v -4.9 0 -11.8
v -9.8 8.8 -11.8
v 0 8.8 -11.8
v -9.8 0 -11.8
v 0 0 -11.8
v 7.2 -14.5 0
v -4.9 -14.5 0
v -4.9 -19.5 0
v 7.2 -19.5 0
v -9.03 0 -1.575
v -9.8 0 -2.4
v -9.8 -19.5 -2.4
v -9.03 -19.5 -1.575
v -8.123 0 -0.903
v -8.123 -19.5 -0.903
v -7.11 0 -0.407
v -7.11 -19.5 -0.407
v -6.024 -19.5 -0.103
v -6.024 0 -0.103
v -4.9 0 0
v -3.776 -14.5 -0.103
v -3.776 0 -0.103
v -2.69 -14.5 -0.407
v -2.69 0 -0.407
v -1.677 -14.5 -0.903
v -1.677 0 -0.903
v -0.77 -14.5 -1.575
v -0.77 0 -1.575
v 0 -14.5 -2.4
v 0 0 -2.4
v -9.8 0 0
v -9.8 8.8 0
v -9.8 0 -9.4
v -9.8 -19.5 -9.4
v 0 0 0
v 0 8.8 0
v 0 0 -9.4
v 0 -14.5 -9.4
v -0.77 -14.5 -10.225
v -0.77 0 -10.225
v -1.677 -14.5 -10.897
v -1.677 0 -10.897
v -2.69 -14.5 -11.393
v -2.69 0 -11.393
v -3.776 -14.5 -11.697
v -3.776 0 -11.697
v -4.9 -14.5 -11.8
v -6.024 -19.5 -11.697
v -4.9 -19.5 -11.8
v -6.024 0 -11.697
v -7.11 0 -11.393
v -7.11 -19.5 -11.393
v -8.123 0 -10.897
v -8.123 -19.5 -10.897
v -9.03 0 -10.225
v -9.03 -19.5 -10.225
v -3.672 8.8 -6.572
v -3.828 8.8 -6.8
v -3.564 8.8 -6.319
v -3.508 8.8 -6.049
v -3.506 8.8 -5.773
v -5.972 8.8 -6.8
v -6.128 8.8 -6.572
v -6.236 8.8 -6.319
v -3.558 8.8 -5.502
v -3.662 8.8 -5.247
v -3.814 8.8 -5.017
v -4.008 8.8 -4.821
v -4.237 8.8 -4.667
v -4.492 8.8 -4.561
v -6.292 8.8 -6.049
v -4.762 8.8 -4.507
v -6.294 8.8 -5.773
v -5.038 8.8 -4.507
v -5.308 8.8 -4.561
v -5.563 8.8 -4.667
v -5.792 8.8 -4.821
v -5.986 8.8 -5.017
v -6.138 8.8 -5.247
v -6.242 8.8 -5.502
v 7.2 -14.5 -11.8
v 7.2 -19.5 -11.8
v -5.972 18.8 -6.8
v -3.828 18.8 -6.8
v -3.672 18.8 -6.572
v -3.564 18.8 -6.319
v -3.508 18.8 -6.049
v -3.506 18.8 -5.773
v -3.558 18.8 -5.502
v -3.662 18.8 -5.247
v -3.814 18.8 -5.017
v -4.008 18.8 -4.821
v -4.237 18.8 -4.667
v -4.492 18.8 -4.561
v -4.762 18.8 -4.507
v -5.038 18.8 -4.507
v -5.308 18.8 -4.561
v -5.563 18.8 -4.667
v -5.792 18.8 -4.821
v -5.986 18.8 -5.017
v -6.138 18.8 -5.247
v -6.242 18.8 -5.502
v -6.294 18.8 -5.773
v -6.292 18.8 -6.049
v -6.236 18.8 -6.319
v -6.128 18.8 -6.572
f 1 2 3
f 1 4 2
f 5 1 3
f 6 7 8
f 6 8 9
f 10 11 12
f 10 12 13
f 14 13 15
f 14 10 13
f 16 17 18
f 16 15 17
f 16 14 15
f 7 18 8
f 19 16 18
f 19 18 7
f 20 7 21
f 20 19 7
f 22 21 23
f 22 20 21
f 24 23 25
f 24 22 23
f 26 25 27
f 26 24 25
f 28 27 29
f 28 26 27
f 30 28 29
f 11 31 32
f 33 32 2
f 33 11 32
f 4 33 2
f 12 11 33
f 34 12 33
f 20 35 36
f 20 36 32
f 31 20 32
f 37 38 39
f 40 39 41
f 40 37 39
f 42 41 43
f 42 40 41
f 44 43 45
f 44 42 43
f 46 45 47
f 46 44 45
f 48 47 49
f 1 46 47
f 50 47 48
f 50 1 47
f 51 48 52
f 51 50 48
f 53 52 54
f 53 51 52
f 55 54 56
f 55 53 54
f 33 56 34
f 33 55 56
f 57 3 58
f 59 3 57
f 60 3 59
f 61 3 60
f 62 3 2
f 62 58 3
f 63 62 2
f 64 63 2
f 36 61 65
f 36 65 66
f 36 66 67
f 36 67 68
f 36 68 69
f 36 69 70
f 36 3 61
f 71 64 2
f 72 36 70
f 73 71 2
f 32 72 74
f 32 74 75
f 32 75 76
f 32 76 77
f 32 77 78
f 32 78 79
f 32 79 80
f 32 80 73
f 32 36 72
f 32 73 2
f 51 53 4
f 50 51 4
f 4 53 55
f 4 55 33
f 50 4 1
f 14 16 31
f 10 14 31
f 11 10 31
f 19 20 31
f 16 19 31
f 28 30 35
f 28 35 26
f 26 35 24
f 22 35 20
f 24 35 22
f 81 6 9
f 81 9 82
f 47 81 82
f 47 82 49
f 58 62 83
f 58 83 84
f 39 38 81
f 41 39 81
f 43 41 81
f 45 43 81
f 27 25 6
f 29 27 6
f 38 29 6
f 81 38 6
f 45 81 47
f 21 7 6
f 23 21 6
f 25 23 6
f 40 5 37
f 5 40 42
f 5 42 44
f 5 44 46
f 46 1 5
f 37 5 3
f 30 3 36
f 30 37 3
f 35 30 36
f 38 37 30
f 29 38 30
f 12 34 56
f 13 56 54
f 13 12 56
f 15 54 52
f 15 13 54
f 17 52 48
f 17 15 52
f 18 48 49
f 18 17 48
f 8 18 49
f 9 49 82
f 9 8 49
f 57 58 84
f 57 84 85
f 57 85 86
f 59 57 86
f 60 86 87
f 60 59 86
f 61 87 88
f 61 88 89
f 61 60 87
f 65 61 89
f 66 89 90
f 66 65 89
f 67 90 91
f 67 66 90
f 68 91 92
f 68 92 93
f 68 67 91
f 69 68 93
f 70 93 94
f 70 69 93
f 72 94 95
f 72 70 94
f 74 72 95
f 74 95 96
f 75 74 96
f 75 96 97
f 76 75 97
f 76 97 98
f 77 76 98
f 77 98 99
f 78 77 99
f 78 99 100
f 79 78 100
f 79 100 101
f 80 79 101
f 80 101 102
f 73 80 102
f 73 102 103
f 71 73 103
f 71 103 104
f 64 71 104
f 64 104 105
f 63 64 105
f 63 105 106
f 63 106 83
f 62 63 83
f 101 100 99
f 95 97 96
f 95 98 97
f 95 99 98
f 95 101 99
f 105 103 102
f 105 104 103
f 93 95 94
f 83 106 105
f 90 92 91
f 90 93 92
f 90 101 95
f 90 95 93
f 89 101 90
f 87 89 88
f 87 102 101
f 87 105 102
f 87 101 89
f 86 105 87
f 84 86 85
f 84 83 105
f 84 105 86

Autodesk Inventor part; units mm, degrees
ref_plane "YZ Plane" through (0, 0, 0) normal (1, 0, 0) x (0, 1, 0)
ref_plane "XZ Plane" through (0, 0, 0) normal (0, 1, 0) x (-1, 0, 0)
ref_plane "XY Plane" through (0, 0, 0) normal (0, 0, 1) x (1, 0, 0)
sketch "Sketch1" plane through (0, 0, 0) normal (0, 1, 0) x (-1, 0, 0)
  line L0 (0, 0) -> (9.8, 0)
  line L1 (9.8, 0) -> (9.8, -11.8)
  line L2 (9.8, -11.8) -> (0, -11.8)
  line L3 (0, -11.8) -> (0, 0)
  dimension "d0" = 11.8
  dimension "d1" = 9.8
extrude "Extrusion1" add sketch "Sketch1" along normal blind 8.8
sketch "Sketch2" plane through (0, 8.8, 0) normal (0, 1, 0) x (1, 0, 0)
  circle A0 centre (-4.9, 5.9) radius 1.4
  line L0 (-9.8, 0) -> (0, 0) construction
  line L1 (0, 0) -> (0, 11.8) construction
  line L2 (0, 11.8) -> (-9.8, 11.8) construction
  line L3 (-9.8, 11.8) -> (-9.8, 0) construction
  line L4 (0, 11.8) -> (-9.8, 11.8) construction
  line L5 (-4.9, 11.8) -> (-4.9, 0) construction
  line L6 (-9.8, 0) -> (0, 0) construction
  line L7 (-9.8, 11.8) -> (-9.8, 0) construction
  line L8 (-9.8, 5.9) -> (0, 5.9) construction
  line L9 (0, 0) -> (0, 11.8) construction
  line L10 (-5.9724, 6.8) -> (-3.8276, 6.8)
  point P0 (-4.9, 5.9)
  dimension "d4" = 2.8
  dimension "d5" = 0.9
extrude "Extrusion2" add sketch "Sketch2" along normal blind 10 contours A0 L10 picked at (-5.0611, 5.8774)
sketch "Sketch3" plane through (0, 0, 0) normal (0, -1, 0) x (1, 0, 0)
  line L0 (0, 0) -> (0, -11.8) projected
  line L1 (0, -2.4) -> (0, -9.4)
  line L2 (-9.8, -11.8) -> (-9.8, 0) projected
  line L3 (-9.8, -2.4) -> (-9.8, -9.4)
  arc A0 (0, -2.4) -> (-9.8, -2.4) centre (-4.9, -6.2021) ccw
  arc A1 (-9.8, -9.4) -> (0, -9.4) centre (-4.9, -5.5979) ccw
  line L4 (-9.8, 0) -> (0, 0) projected
  line L5 (0, -11.8) -> (-9.8, -11.8) projected
  point P0 (0, -5.9)
  point P1 (-9.8, -5.9)
  point P2 (-4.9, 0)
  point P3 (-4.9, -11.8)
  dimension "d8" = 7
  dimension "d9" = 7
extrude "Extrusion3" add sketch "Sketch3" along normal blind 14.5 contours L0 A1 L2 A0
sketch "Sketch4" plane through (0, -14.5, 0) normal (0, -1, 0) x (1, 0, 0)
  arc A0 (0, -2.4) -> (-9.8, -2.4) centre (-4.9, -6.2021) ccw projected
  line L0 (-9.8, -2.4) -> (-9.8, -9.4) projected
  arc A1 (-9.8, -9.4) -> (0, -9.4) centre (-4.9, -5.5979) ccw projected
  line L1 (0, -9.4) -> (0, -2.4) projected
  line L2 (-9.8, 0) -> (0, 0) projected
  line L3 (-4.9, 0) -> (7.2, 0)
  line L4 (7.2, 0) -> (7.2, -11.8)
  line L5 (7.2, -11.8) -> (-4.9, -11.8)
  line L6 (-4.9, -11.8) -> (-4.9, 0)
  dimension "d12" = 17
extrude "Extrusion4" add sketch "Sketch4" along normal blind 5
properties part number "moteur"
